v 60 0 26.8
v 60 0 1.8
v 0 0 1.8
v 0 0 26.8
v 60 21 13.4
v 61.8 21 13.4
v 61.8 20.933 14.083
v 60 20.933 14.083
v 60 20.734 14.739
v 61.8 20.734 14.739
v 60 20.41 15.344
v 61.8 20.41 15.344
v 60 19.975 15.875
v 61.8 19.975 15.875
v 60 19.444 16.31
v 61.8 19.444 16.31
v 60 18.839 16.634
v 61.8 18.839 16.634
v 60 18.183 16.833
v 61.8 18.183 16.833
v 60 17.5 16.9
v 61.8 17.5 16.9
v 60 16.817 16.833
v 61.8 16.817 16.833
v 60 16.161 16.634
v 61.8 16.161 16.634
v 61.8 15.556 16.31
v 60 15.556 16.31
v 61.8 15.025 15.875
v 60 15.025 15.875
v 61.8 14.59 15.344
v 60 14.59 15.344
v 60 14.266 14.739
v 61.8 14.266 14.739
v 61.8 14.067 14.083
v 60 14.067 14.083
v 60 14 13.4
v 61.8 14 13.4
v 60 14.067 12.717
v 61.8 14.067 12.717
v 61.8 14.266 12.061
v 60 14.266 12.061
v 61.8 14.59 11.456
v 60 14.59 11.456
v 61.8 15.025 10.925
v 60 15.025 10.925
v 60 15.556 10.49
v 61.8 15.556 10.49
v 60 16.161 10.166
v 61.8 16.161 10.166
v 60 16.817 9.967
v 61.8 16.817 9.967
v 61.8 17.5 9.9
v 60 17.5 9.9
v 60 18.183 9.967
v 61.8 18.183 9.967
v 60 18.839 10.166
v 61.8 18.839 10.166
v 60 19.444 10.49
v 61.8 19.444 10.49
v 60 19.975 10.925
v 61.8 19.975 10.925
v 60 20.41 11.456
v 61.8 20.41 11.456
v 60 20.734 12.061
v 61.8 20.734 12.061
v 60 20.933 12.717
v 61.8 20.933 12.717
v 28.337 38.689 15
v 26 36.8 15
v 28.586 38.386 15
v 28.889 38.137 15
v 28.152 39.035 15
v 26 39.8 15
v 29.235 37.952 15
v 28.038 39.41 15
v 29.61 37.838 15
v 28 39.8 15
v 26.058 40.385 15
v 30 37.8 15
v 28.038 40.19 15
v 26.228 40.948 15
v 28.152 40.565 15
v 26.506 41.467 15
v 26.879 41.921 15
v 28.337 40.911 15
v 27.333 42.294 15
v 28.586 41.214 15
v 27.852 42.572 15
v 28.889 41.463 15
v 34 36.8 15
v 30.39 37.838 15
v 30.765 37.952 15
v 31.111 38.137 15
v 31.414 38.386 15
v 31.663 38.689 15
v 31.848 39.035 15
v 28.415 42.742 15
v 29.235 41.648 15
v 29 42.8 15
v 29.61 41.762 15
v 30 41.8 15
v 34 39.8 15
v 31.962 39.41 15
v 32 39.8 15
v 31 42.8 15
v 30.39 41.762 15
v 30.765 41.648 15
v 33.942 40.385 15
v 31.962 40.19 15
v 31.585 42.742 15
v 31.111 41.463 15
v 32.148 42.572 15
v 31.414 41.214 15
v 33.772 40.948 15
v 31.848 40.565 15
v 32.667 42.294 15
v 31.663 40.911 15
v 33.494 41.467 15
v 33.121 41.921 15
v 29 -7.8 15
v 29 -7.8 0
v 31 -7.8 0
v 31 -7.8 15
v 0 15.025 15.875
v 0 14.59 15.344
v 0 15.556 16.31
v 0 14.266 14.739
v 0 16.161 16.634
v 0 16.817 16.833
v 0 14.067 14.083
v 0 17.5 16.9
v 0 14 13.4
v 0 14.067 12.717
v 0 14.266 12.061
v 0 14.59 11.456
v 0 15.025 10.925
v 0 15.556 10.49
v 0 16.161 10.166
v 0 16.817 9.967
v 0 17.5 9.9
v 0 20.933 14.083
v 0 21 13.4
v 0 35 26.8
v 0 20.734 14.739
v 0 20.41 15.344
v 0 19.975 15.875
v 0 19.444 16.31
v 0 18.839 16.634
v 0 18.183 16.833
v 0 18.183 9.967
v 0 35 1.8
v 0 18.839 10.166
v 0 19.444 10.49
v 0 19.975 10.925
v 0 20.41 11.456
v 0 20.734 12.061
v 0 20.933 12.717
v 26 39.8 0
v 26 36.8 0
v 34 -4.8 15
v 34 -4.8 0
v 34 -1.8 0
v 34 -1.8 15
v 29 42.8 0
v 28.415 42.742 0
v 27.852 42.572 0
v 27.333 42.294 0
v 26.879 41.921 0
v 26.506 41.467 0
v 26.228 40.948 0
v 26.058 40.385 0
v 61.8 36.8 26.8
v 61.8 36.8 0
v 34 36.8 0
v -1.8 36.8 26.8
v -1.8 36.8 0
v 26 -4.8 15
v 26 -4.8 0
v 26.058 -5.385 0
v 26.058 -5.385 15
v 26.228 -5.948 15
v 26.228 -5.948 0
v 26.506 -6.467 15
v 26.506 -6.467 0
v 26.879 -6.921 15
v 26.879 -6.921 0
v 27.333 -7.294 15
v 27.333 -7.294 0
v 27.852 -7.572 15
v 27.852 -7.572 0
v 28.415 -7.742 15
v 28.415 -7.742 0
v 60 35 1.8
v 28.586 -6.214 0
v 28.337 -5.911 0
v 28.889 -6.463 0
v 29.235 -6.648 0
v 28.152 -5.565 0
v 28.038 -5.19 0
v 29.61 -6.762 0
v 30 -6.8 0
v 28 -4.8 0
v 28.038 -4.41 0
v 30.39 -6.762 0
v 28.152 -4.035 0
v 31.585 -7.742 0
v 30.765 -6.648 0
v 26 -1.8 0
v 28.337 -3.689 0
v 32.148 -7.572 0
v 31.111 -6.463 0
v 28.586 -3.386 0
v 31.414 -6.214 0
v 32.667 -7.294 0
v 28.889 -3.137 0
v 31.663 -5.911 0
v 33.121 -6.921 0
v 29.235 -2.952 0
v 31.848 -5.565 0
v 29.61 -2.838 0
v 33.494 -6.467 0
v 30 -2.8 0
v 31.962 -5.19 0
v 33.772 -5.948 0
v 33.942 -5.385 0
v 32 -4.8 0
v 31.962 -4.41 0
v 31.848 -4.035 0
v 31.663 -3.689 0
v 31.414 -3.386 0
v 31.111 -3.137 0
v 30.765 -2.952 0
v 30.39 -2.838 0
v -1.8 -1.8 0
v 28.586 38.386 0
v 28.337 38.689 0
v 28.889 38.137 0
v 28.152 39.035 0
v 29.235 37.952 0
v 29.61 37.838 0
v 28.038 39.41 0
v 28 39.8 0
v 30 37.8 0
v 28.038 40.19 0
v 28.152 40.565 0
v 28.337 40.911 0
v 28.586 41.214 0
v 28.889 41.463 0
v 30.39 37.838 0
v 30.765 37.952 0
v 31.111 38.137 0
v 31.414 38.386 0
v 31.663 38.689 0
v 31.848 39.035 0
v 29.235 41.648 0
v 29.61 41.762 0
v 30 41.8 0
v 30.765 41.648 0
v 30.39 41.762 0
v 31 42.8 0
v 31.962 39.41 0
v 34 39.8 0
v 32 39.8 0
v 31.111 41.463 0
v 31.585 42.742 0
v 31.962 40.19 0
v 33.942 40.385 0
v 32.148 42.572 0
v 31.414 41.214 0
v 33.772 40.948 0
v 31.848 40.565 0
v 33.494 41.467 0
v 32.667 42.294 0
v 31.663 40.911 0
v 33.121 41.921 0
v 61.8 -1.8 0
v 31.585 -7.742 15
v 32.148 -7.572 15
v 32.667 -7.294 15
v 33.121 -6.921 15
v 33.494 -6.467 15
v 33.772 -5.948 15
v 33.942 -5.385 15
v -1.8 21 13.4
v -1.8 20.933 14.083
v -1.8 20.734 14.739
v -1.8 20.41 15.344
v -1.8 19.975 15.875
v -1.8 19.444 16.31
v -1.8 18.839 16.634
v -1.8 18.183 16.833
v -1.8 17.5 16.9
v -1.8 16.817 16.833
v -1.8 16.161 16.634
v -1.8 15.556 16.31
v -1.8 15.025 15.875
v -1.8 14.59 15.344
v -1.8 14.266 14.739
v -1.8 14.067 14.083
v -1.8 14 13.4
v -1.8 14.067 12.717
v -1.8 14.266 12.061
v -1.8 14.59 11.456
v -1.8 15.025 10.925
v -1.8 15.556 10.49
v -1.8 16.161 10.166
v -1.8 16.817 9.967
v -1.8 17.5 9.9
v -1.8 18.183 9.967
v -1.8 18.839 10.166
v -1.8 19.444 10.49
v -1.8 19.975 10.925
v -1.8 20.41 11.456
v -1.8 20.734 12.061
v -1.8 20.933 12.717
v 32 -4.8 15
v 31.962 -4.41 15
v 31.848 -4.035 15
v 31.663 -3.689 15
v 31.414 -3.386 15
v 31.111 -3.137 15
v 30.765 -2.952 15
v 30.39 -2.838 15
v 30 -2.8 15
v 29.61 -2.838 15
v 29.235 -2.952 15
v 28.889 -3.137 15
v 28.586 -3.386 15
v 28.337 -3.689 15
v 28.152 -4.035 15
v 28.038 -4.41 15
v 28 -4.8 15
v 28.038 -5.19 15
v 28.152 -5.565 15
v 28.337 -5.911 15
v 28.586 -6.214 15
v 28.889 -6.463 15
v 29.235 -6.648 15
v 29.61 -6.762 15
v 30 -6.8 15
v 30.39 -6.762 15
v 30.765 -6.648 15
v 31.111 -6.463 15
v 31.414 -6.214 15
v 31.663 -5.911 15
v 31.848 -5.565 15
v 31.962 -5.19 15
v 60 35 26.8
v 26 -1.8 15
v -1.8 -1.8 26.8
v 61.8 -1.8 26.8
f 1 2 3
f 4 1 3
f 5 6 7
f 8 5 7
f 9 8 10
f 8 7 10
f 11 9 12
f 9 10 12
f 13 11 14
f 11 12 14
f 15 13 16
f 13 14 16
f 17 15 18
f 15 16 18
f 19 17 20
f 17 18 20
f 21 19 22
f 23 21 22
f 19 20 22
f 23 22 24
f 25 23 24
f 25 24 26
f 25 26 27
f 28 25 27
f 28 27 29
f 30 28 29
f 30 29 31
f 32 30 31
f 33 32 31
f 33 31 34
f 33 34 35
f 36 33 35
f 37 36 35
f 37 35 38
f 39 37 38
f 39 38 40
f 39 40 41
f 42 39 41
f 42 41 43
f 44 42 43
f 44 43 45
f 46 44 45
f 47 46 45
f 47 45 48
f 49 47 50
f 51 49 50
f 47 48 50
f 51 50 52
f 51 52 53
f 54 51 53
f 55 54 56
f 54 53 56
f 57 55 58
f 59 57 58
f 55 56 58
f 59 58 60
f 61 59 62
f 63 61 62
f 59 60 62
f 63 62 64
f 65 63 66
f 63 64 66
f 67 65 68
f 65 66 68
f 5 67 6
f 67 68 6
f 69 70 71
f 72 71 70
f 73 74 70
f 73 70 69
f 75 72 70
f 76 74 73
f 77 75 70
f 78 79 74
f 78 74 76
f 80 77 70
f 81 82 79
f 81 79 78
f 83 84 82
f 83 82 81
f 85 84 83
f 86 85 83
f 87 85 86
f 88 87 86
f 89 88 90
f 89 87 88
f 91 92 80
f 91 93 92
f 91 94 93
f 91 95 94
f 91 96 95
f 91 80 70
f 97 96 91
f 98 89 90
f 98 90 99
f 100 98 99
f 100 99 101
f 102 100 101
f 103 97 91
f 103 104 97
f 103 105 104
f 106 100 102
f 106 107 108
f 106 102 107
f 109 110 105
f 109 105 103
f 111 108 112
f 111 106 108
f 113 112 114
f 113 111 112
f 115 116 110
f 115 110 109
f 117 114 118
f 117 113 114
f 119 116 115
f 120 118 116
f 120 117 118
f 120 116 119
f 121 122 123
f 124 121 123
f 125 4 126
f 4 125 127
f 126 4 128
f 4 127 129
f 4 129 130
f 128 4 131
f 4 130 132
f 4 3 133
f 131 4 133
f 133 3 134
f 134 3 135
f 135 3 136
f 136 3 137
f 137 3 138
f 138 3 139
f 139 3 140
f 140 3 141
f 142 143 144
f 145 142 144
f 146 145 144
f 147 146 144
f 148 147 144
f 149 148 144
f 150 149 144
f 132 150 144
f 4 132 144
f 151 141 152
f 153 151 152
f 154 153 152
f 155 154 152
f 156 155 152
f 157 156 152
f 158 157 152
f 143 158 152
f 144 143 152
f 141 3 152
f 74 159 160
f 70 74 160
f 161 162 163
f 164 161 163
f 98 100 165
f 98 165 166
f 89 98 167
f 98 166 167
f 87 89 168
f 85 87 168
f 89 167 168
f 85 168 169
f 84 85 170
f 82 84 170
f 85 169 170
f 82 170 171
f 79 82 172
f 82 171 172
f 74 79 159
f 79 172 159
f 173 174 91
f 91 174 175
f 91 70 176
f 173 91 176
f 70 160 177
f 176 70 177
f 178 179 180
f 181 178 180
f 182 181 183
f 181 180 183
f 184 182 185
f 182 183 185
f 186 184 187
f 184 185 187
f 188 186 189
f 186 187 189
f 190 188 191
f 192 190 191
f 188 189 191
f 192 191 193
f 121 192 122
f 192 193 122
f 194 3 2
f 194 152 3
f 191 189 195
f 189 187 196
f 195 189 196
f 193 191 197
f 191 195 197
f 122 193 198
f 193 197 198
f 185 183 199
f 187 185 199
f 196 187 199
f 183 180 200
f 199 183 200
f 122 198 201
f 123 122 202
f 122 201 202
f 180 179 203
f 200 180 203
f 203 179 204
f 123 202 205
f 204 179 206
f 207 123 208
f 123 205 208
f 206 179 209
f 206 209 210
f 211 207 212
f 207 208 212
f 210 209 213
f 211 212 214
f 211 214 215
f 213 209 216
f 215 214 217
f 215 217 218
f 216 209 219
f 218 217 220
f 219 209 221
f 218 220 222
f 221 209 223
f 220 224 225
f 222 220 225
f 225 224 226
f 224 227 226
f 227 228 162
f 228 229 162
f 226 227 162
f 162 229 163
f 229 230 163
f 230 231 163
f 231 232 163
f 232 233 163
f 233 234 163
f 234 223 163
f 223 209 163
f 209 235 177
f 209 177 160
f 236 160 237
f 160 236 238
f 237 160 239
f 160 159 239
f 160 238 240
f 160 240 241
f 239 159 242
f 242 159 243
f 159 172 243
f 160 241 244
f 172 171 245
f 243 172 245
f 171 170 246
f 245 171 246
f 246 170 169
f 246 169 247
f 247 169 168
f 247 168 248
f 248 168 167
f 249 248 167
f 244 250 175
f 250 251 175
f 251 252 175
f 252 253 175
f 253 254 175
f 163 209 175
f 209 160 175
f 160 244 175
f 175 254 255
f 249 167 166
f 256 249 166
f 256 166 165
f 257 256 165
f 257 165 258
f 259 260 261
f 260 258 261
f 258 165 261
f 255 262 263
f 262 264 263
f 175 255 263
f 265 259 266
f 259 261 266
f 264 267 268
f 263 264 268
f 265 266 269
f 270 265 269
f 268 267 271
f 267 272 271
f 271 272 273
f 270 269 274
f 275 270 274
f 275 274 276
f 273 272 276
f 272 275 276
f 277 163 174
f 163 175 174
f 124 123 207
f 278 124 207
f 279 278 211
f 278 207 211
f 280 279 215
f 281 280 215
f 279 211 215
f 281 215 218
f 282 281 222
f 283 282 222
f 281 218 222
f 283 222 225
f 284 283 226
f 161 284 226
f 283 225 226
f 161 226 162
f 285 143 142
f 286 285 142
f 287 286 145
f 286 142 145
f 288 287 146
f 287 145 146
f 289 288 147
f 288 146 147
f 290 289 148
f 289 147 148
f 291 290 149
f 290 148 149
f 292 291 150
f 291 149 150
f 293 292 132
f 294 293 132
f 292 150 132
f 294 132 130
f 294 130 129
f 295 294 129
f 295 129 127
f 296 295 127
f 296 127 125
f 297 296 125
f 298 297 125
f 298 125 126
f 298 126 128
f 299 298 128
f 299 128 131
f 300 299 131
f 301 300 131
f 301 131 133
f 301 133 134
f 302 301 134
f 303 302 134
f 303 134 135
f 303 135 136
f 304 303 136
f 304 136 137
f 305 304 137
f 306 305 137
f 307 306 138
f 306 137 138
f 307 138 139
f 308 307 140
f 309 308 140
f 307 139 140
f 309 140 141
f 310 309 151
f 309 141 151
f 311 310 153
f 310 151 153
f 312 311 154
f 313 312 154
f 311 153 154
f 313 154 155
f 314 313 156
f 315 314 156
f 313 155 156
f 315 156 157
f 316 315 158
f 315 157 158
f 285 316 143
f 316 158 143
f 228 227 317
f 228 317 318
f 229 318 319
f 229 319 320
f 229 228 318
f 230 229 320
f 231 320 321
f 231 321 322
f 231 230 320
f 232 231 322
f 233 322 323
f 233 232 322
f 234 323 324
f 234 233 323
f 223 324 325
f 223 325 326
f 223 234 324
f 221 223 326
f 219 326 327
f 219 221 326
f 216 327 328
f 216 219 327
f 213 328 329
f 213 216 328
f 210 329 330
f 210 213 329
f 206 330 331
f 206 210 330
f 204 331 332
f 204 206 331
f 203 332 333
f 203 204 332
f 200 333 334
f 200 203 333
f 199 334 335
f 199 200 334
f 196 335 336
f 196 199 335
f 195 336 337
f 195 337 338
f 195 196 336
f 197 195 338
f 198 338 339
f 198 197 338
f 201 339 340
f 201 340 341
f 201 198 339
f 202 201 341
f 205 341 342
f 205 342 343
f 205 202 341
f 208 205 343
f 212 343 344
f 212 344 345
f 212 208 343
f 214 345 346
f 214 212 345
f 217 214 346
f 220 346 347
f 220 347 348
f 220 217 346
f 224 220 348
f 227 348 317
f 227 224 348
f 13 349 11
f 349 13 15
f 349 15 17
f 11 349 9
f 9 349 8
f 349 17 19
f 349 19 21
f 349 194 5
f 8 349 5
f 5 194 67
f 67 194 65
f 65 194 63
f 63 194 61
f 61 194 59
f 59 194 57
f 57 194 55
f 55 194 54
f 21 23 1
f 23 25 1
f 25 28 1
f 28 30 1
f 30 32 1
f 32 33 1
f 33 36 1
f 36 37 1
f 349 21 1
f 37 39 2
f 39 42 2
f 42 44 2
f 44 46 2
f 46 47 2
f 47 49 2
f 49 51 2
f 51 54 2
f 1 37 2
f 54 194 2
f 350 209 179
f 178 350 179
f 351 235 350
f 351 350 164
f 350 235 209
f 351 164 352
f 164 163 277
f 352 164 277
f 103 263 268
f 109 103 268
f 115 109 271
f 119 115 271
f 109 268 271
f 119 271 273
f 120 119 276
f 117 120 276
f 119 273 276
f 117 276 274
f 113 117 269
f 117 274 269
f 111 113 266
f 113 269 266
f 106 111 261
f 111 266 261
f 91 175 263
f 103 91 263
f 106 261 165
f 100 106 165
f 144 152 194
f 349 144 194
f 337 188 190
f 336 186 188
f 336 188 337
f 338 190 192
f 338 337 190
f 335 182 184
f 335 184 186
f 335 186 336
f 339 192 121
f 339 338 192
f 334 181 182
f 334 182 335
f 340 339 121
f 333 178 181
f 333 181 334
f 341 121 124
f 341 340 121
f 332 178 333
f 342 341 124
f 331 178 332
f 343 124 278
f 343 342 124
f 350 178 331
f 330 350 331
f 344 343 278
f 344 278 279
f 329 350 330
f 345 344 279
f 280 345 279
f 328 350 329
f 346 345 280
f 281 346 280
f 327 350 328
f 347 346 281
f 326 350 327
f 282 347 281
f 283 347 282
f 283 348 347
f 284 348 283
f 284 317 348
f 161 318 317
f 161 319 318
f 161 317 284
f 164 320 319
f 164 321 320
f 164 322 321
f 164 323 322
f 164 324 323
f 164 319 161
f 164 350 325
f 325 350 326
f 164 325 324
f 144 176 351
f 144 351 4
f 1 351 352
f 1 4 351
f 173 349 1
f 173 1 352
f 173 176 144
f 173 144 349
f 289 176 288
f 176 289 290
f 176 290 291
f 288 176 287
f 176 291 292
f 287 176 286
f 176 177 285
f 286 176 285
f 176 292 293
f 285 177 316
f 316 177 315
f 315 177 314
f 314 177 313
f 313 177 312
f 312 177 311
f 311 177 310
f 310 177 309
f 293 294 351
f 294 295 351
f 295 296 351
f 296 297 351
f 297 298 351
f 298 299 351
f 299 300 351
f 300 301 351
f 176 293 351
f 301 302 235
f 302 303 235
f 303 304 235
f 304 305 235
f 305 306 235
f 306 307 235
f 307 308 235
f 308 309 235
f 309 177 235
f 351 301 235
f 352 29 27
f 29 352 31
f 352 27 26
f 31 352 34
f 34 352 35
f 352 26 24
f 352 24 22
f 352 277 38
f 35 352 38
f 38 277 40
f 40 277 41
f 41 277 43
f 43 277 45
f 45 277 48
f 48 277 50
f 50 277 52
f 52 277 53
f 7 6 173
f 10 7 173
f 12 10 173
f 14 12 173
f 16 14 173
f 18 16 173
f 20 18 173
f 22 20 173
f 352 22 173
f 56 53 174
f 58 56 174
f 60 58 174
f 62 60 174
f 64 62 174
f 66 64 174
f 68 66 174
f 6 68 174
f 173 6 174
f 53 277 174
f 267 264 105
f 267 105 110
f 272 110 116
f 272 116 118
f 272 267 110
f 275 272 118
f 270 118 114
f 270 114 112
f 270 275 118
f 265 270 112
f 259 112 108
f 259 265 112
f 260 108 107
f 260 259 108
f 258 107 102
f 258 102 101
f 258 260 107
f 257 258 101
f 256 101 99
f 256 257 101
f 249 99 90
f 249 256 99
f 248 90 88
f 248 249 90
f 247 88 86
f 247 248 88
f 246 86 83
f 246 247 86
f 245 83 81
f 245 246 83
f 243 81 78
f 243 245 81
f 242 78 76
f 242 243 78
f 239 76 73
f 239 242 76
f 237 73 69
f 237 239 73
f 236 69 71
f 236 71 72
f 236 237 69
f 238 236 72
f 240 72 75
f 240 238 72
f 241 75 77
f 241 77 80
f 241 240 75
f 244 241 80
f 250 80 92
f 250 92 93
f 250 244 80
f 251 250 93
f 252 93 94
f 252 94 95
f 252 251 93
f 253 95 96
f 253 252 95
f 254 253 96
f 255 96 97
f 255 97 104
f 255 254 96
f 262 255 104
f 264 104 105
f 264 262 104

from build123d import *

# Parameters (mm, degrees)
F0_W     = 60
F0_H     = 35
F1_DEPTH = 1.8
F3_DEPTH = 25
F0_R     = 2
F4_DEPTH = 15
F5_R     = 3.5
F6_DEPTH = 63.601


with BuildPart() as f1:
    # F0 (on Top) → F1 (new body)
    with BuildSketch(Plane.XY):
        Polygon((26, 36.8), (-1.8, 36.8), (-1.8, -1.8), (26, -1.8), (34, -1.8), (61.8, -1.8), (61.8, 36.8), (34, 36.8), align=None)
        with Locations((30, 17.5)):
            Rectangle(F0_W, F0_H, mode=Mode.SUBTRACT)
        with Locations((30, 17.5)):
            Rectangle(F0_W, F0_H)
    extrude(amount=F1_DEPTH)

    # F2 (on face) → F3 (join)
    with BuildSketch(Plane.XY.offset(1.8)):
        Polygon((-1.8, -1.8), (15.426563, -1.8), (61.8, -1.8), (61.8, 36.8), (-1.8, 36.8), align=None)
        Polygon((16.889177, 0), (0, 0), (0, 35), (60, 35), (60, 0), align=None, mode=Mode.SUBTRACT)
    extrude(amount=F3_DEPTH)

    # F0 (on Top) → F4 (join)
    with BuildSketch(Plane.XY):
        with BuildLine():
            Line((34, -1.8), (26, -1.8))
            Line((26, -1.8), (26, -4.8))
            ThreePointArc((26, -4.8), (26.87868, -6.92132), (29, -7.8))
            Line((29, -7.8), (31, -7.8))
            ThreePointArc((31, -7.8), (33.12132, -6.92132), (34, -4.8))
            Line((34, -4.8), (34, -1.8))
        make_face()
        with Locations((30, -4.8)):
            Circle(F0_R, mode=Mode.SUBTRACT)
        with BuildLine():
            Line((26, 39.8), (26, 36.8))
            Line((26, 36.8), (34, 36.8))
            Line((34, 36.8), (34, 39.8))
            ThreePointArc((34, 39.8), (33.12132, 41.92132), (31, 42.8))
            Line((31, 42.8), (29, 42.8))
            ThreePointArc((29, 42.8), (26.87868, 41.92132), (26, 39.8))
        make_face()
        with Locations((30, 39.8)):
            Circle(F0_R, mode=Mode.SUBTRACT)
    extrude(amount=F4_DEPTH)

    # F5 (on face) → F6 (cut, through all)
    with BuildSketch(Plane.YZ.offset(61.8)):
        with Locations((17.5, 13.4)):
            Circle(F5_R)
    extrude(amount=-F6_DEPTH, mode=Mode.SUBTRACT)


solid = f1.part
